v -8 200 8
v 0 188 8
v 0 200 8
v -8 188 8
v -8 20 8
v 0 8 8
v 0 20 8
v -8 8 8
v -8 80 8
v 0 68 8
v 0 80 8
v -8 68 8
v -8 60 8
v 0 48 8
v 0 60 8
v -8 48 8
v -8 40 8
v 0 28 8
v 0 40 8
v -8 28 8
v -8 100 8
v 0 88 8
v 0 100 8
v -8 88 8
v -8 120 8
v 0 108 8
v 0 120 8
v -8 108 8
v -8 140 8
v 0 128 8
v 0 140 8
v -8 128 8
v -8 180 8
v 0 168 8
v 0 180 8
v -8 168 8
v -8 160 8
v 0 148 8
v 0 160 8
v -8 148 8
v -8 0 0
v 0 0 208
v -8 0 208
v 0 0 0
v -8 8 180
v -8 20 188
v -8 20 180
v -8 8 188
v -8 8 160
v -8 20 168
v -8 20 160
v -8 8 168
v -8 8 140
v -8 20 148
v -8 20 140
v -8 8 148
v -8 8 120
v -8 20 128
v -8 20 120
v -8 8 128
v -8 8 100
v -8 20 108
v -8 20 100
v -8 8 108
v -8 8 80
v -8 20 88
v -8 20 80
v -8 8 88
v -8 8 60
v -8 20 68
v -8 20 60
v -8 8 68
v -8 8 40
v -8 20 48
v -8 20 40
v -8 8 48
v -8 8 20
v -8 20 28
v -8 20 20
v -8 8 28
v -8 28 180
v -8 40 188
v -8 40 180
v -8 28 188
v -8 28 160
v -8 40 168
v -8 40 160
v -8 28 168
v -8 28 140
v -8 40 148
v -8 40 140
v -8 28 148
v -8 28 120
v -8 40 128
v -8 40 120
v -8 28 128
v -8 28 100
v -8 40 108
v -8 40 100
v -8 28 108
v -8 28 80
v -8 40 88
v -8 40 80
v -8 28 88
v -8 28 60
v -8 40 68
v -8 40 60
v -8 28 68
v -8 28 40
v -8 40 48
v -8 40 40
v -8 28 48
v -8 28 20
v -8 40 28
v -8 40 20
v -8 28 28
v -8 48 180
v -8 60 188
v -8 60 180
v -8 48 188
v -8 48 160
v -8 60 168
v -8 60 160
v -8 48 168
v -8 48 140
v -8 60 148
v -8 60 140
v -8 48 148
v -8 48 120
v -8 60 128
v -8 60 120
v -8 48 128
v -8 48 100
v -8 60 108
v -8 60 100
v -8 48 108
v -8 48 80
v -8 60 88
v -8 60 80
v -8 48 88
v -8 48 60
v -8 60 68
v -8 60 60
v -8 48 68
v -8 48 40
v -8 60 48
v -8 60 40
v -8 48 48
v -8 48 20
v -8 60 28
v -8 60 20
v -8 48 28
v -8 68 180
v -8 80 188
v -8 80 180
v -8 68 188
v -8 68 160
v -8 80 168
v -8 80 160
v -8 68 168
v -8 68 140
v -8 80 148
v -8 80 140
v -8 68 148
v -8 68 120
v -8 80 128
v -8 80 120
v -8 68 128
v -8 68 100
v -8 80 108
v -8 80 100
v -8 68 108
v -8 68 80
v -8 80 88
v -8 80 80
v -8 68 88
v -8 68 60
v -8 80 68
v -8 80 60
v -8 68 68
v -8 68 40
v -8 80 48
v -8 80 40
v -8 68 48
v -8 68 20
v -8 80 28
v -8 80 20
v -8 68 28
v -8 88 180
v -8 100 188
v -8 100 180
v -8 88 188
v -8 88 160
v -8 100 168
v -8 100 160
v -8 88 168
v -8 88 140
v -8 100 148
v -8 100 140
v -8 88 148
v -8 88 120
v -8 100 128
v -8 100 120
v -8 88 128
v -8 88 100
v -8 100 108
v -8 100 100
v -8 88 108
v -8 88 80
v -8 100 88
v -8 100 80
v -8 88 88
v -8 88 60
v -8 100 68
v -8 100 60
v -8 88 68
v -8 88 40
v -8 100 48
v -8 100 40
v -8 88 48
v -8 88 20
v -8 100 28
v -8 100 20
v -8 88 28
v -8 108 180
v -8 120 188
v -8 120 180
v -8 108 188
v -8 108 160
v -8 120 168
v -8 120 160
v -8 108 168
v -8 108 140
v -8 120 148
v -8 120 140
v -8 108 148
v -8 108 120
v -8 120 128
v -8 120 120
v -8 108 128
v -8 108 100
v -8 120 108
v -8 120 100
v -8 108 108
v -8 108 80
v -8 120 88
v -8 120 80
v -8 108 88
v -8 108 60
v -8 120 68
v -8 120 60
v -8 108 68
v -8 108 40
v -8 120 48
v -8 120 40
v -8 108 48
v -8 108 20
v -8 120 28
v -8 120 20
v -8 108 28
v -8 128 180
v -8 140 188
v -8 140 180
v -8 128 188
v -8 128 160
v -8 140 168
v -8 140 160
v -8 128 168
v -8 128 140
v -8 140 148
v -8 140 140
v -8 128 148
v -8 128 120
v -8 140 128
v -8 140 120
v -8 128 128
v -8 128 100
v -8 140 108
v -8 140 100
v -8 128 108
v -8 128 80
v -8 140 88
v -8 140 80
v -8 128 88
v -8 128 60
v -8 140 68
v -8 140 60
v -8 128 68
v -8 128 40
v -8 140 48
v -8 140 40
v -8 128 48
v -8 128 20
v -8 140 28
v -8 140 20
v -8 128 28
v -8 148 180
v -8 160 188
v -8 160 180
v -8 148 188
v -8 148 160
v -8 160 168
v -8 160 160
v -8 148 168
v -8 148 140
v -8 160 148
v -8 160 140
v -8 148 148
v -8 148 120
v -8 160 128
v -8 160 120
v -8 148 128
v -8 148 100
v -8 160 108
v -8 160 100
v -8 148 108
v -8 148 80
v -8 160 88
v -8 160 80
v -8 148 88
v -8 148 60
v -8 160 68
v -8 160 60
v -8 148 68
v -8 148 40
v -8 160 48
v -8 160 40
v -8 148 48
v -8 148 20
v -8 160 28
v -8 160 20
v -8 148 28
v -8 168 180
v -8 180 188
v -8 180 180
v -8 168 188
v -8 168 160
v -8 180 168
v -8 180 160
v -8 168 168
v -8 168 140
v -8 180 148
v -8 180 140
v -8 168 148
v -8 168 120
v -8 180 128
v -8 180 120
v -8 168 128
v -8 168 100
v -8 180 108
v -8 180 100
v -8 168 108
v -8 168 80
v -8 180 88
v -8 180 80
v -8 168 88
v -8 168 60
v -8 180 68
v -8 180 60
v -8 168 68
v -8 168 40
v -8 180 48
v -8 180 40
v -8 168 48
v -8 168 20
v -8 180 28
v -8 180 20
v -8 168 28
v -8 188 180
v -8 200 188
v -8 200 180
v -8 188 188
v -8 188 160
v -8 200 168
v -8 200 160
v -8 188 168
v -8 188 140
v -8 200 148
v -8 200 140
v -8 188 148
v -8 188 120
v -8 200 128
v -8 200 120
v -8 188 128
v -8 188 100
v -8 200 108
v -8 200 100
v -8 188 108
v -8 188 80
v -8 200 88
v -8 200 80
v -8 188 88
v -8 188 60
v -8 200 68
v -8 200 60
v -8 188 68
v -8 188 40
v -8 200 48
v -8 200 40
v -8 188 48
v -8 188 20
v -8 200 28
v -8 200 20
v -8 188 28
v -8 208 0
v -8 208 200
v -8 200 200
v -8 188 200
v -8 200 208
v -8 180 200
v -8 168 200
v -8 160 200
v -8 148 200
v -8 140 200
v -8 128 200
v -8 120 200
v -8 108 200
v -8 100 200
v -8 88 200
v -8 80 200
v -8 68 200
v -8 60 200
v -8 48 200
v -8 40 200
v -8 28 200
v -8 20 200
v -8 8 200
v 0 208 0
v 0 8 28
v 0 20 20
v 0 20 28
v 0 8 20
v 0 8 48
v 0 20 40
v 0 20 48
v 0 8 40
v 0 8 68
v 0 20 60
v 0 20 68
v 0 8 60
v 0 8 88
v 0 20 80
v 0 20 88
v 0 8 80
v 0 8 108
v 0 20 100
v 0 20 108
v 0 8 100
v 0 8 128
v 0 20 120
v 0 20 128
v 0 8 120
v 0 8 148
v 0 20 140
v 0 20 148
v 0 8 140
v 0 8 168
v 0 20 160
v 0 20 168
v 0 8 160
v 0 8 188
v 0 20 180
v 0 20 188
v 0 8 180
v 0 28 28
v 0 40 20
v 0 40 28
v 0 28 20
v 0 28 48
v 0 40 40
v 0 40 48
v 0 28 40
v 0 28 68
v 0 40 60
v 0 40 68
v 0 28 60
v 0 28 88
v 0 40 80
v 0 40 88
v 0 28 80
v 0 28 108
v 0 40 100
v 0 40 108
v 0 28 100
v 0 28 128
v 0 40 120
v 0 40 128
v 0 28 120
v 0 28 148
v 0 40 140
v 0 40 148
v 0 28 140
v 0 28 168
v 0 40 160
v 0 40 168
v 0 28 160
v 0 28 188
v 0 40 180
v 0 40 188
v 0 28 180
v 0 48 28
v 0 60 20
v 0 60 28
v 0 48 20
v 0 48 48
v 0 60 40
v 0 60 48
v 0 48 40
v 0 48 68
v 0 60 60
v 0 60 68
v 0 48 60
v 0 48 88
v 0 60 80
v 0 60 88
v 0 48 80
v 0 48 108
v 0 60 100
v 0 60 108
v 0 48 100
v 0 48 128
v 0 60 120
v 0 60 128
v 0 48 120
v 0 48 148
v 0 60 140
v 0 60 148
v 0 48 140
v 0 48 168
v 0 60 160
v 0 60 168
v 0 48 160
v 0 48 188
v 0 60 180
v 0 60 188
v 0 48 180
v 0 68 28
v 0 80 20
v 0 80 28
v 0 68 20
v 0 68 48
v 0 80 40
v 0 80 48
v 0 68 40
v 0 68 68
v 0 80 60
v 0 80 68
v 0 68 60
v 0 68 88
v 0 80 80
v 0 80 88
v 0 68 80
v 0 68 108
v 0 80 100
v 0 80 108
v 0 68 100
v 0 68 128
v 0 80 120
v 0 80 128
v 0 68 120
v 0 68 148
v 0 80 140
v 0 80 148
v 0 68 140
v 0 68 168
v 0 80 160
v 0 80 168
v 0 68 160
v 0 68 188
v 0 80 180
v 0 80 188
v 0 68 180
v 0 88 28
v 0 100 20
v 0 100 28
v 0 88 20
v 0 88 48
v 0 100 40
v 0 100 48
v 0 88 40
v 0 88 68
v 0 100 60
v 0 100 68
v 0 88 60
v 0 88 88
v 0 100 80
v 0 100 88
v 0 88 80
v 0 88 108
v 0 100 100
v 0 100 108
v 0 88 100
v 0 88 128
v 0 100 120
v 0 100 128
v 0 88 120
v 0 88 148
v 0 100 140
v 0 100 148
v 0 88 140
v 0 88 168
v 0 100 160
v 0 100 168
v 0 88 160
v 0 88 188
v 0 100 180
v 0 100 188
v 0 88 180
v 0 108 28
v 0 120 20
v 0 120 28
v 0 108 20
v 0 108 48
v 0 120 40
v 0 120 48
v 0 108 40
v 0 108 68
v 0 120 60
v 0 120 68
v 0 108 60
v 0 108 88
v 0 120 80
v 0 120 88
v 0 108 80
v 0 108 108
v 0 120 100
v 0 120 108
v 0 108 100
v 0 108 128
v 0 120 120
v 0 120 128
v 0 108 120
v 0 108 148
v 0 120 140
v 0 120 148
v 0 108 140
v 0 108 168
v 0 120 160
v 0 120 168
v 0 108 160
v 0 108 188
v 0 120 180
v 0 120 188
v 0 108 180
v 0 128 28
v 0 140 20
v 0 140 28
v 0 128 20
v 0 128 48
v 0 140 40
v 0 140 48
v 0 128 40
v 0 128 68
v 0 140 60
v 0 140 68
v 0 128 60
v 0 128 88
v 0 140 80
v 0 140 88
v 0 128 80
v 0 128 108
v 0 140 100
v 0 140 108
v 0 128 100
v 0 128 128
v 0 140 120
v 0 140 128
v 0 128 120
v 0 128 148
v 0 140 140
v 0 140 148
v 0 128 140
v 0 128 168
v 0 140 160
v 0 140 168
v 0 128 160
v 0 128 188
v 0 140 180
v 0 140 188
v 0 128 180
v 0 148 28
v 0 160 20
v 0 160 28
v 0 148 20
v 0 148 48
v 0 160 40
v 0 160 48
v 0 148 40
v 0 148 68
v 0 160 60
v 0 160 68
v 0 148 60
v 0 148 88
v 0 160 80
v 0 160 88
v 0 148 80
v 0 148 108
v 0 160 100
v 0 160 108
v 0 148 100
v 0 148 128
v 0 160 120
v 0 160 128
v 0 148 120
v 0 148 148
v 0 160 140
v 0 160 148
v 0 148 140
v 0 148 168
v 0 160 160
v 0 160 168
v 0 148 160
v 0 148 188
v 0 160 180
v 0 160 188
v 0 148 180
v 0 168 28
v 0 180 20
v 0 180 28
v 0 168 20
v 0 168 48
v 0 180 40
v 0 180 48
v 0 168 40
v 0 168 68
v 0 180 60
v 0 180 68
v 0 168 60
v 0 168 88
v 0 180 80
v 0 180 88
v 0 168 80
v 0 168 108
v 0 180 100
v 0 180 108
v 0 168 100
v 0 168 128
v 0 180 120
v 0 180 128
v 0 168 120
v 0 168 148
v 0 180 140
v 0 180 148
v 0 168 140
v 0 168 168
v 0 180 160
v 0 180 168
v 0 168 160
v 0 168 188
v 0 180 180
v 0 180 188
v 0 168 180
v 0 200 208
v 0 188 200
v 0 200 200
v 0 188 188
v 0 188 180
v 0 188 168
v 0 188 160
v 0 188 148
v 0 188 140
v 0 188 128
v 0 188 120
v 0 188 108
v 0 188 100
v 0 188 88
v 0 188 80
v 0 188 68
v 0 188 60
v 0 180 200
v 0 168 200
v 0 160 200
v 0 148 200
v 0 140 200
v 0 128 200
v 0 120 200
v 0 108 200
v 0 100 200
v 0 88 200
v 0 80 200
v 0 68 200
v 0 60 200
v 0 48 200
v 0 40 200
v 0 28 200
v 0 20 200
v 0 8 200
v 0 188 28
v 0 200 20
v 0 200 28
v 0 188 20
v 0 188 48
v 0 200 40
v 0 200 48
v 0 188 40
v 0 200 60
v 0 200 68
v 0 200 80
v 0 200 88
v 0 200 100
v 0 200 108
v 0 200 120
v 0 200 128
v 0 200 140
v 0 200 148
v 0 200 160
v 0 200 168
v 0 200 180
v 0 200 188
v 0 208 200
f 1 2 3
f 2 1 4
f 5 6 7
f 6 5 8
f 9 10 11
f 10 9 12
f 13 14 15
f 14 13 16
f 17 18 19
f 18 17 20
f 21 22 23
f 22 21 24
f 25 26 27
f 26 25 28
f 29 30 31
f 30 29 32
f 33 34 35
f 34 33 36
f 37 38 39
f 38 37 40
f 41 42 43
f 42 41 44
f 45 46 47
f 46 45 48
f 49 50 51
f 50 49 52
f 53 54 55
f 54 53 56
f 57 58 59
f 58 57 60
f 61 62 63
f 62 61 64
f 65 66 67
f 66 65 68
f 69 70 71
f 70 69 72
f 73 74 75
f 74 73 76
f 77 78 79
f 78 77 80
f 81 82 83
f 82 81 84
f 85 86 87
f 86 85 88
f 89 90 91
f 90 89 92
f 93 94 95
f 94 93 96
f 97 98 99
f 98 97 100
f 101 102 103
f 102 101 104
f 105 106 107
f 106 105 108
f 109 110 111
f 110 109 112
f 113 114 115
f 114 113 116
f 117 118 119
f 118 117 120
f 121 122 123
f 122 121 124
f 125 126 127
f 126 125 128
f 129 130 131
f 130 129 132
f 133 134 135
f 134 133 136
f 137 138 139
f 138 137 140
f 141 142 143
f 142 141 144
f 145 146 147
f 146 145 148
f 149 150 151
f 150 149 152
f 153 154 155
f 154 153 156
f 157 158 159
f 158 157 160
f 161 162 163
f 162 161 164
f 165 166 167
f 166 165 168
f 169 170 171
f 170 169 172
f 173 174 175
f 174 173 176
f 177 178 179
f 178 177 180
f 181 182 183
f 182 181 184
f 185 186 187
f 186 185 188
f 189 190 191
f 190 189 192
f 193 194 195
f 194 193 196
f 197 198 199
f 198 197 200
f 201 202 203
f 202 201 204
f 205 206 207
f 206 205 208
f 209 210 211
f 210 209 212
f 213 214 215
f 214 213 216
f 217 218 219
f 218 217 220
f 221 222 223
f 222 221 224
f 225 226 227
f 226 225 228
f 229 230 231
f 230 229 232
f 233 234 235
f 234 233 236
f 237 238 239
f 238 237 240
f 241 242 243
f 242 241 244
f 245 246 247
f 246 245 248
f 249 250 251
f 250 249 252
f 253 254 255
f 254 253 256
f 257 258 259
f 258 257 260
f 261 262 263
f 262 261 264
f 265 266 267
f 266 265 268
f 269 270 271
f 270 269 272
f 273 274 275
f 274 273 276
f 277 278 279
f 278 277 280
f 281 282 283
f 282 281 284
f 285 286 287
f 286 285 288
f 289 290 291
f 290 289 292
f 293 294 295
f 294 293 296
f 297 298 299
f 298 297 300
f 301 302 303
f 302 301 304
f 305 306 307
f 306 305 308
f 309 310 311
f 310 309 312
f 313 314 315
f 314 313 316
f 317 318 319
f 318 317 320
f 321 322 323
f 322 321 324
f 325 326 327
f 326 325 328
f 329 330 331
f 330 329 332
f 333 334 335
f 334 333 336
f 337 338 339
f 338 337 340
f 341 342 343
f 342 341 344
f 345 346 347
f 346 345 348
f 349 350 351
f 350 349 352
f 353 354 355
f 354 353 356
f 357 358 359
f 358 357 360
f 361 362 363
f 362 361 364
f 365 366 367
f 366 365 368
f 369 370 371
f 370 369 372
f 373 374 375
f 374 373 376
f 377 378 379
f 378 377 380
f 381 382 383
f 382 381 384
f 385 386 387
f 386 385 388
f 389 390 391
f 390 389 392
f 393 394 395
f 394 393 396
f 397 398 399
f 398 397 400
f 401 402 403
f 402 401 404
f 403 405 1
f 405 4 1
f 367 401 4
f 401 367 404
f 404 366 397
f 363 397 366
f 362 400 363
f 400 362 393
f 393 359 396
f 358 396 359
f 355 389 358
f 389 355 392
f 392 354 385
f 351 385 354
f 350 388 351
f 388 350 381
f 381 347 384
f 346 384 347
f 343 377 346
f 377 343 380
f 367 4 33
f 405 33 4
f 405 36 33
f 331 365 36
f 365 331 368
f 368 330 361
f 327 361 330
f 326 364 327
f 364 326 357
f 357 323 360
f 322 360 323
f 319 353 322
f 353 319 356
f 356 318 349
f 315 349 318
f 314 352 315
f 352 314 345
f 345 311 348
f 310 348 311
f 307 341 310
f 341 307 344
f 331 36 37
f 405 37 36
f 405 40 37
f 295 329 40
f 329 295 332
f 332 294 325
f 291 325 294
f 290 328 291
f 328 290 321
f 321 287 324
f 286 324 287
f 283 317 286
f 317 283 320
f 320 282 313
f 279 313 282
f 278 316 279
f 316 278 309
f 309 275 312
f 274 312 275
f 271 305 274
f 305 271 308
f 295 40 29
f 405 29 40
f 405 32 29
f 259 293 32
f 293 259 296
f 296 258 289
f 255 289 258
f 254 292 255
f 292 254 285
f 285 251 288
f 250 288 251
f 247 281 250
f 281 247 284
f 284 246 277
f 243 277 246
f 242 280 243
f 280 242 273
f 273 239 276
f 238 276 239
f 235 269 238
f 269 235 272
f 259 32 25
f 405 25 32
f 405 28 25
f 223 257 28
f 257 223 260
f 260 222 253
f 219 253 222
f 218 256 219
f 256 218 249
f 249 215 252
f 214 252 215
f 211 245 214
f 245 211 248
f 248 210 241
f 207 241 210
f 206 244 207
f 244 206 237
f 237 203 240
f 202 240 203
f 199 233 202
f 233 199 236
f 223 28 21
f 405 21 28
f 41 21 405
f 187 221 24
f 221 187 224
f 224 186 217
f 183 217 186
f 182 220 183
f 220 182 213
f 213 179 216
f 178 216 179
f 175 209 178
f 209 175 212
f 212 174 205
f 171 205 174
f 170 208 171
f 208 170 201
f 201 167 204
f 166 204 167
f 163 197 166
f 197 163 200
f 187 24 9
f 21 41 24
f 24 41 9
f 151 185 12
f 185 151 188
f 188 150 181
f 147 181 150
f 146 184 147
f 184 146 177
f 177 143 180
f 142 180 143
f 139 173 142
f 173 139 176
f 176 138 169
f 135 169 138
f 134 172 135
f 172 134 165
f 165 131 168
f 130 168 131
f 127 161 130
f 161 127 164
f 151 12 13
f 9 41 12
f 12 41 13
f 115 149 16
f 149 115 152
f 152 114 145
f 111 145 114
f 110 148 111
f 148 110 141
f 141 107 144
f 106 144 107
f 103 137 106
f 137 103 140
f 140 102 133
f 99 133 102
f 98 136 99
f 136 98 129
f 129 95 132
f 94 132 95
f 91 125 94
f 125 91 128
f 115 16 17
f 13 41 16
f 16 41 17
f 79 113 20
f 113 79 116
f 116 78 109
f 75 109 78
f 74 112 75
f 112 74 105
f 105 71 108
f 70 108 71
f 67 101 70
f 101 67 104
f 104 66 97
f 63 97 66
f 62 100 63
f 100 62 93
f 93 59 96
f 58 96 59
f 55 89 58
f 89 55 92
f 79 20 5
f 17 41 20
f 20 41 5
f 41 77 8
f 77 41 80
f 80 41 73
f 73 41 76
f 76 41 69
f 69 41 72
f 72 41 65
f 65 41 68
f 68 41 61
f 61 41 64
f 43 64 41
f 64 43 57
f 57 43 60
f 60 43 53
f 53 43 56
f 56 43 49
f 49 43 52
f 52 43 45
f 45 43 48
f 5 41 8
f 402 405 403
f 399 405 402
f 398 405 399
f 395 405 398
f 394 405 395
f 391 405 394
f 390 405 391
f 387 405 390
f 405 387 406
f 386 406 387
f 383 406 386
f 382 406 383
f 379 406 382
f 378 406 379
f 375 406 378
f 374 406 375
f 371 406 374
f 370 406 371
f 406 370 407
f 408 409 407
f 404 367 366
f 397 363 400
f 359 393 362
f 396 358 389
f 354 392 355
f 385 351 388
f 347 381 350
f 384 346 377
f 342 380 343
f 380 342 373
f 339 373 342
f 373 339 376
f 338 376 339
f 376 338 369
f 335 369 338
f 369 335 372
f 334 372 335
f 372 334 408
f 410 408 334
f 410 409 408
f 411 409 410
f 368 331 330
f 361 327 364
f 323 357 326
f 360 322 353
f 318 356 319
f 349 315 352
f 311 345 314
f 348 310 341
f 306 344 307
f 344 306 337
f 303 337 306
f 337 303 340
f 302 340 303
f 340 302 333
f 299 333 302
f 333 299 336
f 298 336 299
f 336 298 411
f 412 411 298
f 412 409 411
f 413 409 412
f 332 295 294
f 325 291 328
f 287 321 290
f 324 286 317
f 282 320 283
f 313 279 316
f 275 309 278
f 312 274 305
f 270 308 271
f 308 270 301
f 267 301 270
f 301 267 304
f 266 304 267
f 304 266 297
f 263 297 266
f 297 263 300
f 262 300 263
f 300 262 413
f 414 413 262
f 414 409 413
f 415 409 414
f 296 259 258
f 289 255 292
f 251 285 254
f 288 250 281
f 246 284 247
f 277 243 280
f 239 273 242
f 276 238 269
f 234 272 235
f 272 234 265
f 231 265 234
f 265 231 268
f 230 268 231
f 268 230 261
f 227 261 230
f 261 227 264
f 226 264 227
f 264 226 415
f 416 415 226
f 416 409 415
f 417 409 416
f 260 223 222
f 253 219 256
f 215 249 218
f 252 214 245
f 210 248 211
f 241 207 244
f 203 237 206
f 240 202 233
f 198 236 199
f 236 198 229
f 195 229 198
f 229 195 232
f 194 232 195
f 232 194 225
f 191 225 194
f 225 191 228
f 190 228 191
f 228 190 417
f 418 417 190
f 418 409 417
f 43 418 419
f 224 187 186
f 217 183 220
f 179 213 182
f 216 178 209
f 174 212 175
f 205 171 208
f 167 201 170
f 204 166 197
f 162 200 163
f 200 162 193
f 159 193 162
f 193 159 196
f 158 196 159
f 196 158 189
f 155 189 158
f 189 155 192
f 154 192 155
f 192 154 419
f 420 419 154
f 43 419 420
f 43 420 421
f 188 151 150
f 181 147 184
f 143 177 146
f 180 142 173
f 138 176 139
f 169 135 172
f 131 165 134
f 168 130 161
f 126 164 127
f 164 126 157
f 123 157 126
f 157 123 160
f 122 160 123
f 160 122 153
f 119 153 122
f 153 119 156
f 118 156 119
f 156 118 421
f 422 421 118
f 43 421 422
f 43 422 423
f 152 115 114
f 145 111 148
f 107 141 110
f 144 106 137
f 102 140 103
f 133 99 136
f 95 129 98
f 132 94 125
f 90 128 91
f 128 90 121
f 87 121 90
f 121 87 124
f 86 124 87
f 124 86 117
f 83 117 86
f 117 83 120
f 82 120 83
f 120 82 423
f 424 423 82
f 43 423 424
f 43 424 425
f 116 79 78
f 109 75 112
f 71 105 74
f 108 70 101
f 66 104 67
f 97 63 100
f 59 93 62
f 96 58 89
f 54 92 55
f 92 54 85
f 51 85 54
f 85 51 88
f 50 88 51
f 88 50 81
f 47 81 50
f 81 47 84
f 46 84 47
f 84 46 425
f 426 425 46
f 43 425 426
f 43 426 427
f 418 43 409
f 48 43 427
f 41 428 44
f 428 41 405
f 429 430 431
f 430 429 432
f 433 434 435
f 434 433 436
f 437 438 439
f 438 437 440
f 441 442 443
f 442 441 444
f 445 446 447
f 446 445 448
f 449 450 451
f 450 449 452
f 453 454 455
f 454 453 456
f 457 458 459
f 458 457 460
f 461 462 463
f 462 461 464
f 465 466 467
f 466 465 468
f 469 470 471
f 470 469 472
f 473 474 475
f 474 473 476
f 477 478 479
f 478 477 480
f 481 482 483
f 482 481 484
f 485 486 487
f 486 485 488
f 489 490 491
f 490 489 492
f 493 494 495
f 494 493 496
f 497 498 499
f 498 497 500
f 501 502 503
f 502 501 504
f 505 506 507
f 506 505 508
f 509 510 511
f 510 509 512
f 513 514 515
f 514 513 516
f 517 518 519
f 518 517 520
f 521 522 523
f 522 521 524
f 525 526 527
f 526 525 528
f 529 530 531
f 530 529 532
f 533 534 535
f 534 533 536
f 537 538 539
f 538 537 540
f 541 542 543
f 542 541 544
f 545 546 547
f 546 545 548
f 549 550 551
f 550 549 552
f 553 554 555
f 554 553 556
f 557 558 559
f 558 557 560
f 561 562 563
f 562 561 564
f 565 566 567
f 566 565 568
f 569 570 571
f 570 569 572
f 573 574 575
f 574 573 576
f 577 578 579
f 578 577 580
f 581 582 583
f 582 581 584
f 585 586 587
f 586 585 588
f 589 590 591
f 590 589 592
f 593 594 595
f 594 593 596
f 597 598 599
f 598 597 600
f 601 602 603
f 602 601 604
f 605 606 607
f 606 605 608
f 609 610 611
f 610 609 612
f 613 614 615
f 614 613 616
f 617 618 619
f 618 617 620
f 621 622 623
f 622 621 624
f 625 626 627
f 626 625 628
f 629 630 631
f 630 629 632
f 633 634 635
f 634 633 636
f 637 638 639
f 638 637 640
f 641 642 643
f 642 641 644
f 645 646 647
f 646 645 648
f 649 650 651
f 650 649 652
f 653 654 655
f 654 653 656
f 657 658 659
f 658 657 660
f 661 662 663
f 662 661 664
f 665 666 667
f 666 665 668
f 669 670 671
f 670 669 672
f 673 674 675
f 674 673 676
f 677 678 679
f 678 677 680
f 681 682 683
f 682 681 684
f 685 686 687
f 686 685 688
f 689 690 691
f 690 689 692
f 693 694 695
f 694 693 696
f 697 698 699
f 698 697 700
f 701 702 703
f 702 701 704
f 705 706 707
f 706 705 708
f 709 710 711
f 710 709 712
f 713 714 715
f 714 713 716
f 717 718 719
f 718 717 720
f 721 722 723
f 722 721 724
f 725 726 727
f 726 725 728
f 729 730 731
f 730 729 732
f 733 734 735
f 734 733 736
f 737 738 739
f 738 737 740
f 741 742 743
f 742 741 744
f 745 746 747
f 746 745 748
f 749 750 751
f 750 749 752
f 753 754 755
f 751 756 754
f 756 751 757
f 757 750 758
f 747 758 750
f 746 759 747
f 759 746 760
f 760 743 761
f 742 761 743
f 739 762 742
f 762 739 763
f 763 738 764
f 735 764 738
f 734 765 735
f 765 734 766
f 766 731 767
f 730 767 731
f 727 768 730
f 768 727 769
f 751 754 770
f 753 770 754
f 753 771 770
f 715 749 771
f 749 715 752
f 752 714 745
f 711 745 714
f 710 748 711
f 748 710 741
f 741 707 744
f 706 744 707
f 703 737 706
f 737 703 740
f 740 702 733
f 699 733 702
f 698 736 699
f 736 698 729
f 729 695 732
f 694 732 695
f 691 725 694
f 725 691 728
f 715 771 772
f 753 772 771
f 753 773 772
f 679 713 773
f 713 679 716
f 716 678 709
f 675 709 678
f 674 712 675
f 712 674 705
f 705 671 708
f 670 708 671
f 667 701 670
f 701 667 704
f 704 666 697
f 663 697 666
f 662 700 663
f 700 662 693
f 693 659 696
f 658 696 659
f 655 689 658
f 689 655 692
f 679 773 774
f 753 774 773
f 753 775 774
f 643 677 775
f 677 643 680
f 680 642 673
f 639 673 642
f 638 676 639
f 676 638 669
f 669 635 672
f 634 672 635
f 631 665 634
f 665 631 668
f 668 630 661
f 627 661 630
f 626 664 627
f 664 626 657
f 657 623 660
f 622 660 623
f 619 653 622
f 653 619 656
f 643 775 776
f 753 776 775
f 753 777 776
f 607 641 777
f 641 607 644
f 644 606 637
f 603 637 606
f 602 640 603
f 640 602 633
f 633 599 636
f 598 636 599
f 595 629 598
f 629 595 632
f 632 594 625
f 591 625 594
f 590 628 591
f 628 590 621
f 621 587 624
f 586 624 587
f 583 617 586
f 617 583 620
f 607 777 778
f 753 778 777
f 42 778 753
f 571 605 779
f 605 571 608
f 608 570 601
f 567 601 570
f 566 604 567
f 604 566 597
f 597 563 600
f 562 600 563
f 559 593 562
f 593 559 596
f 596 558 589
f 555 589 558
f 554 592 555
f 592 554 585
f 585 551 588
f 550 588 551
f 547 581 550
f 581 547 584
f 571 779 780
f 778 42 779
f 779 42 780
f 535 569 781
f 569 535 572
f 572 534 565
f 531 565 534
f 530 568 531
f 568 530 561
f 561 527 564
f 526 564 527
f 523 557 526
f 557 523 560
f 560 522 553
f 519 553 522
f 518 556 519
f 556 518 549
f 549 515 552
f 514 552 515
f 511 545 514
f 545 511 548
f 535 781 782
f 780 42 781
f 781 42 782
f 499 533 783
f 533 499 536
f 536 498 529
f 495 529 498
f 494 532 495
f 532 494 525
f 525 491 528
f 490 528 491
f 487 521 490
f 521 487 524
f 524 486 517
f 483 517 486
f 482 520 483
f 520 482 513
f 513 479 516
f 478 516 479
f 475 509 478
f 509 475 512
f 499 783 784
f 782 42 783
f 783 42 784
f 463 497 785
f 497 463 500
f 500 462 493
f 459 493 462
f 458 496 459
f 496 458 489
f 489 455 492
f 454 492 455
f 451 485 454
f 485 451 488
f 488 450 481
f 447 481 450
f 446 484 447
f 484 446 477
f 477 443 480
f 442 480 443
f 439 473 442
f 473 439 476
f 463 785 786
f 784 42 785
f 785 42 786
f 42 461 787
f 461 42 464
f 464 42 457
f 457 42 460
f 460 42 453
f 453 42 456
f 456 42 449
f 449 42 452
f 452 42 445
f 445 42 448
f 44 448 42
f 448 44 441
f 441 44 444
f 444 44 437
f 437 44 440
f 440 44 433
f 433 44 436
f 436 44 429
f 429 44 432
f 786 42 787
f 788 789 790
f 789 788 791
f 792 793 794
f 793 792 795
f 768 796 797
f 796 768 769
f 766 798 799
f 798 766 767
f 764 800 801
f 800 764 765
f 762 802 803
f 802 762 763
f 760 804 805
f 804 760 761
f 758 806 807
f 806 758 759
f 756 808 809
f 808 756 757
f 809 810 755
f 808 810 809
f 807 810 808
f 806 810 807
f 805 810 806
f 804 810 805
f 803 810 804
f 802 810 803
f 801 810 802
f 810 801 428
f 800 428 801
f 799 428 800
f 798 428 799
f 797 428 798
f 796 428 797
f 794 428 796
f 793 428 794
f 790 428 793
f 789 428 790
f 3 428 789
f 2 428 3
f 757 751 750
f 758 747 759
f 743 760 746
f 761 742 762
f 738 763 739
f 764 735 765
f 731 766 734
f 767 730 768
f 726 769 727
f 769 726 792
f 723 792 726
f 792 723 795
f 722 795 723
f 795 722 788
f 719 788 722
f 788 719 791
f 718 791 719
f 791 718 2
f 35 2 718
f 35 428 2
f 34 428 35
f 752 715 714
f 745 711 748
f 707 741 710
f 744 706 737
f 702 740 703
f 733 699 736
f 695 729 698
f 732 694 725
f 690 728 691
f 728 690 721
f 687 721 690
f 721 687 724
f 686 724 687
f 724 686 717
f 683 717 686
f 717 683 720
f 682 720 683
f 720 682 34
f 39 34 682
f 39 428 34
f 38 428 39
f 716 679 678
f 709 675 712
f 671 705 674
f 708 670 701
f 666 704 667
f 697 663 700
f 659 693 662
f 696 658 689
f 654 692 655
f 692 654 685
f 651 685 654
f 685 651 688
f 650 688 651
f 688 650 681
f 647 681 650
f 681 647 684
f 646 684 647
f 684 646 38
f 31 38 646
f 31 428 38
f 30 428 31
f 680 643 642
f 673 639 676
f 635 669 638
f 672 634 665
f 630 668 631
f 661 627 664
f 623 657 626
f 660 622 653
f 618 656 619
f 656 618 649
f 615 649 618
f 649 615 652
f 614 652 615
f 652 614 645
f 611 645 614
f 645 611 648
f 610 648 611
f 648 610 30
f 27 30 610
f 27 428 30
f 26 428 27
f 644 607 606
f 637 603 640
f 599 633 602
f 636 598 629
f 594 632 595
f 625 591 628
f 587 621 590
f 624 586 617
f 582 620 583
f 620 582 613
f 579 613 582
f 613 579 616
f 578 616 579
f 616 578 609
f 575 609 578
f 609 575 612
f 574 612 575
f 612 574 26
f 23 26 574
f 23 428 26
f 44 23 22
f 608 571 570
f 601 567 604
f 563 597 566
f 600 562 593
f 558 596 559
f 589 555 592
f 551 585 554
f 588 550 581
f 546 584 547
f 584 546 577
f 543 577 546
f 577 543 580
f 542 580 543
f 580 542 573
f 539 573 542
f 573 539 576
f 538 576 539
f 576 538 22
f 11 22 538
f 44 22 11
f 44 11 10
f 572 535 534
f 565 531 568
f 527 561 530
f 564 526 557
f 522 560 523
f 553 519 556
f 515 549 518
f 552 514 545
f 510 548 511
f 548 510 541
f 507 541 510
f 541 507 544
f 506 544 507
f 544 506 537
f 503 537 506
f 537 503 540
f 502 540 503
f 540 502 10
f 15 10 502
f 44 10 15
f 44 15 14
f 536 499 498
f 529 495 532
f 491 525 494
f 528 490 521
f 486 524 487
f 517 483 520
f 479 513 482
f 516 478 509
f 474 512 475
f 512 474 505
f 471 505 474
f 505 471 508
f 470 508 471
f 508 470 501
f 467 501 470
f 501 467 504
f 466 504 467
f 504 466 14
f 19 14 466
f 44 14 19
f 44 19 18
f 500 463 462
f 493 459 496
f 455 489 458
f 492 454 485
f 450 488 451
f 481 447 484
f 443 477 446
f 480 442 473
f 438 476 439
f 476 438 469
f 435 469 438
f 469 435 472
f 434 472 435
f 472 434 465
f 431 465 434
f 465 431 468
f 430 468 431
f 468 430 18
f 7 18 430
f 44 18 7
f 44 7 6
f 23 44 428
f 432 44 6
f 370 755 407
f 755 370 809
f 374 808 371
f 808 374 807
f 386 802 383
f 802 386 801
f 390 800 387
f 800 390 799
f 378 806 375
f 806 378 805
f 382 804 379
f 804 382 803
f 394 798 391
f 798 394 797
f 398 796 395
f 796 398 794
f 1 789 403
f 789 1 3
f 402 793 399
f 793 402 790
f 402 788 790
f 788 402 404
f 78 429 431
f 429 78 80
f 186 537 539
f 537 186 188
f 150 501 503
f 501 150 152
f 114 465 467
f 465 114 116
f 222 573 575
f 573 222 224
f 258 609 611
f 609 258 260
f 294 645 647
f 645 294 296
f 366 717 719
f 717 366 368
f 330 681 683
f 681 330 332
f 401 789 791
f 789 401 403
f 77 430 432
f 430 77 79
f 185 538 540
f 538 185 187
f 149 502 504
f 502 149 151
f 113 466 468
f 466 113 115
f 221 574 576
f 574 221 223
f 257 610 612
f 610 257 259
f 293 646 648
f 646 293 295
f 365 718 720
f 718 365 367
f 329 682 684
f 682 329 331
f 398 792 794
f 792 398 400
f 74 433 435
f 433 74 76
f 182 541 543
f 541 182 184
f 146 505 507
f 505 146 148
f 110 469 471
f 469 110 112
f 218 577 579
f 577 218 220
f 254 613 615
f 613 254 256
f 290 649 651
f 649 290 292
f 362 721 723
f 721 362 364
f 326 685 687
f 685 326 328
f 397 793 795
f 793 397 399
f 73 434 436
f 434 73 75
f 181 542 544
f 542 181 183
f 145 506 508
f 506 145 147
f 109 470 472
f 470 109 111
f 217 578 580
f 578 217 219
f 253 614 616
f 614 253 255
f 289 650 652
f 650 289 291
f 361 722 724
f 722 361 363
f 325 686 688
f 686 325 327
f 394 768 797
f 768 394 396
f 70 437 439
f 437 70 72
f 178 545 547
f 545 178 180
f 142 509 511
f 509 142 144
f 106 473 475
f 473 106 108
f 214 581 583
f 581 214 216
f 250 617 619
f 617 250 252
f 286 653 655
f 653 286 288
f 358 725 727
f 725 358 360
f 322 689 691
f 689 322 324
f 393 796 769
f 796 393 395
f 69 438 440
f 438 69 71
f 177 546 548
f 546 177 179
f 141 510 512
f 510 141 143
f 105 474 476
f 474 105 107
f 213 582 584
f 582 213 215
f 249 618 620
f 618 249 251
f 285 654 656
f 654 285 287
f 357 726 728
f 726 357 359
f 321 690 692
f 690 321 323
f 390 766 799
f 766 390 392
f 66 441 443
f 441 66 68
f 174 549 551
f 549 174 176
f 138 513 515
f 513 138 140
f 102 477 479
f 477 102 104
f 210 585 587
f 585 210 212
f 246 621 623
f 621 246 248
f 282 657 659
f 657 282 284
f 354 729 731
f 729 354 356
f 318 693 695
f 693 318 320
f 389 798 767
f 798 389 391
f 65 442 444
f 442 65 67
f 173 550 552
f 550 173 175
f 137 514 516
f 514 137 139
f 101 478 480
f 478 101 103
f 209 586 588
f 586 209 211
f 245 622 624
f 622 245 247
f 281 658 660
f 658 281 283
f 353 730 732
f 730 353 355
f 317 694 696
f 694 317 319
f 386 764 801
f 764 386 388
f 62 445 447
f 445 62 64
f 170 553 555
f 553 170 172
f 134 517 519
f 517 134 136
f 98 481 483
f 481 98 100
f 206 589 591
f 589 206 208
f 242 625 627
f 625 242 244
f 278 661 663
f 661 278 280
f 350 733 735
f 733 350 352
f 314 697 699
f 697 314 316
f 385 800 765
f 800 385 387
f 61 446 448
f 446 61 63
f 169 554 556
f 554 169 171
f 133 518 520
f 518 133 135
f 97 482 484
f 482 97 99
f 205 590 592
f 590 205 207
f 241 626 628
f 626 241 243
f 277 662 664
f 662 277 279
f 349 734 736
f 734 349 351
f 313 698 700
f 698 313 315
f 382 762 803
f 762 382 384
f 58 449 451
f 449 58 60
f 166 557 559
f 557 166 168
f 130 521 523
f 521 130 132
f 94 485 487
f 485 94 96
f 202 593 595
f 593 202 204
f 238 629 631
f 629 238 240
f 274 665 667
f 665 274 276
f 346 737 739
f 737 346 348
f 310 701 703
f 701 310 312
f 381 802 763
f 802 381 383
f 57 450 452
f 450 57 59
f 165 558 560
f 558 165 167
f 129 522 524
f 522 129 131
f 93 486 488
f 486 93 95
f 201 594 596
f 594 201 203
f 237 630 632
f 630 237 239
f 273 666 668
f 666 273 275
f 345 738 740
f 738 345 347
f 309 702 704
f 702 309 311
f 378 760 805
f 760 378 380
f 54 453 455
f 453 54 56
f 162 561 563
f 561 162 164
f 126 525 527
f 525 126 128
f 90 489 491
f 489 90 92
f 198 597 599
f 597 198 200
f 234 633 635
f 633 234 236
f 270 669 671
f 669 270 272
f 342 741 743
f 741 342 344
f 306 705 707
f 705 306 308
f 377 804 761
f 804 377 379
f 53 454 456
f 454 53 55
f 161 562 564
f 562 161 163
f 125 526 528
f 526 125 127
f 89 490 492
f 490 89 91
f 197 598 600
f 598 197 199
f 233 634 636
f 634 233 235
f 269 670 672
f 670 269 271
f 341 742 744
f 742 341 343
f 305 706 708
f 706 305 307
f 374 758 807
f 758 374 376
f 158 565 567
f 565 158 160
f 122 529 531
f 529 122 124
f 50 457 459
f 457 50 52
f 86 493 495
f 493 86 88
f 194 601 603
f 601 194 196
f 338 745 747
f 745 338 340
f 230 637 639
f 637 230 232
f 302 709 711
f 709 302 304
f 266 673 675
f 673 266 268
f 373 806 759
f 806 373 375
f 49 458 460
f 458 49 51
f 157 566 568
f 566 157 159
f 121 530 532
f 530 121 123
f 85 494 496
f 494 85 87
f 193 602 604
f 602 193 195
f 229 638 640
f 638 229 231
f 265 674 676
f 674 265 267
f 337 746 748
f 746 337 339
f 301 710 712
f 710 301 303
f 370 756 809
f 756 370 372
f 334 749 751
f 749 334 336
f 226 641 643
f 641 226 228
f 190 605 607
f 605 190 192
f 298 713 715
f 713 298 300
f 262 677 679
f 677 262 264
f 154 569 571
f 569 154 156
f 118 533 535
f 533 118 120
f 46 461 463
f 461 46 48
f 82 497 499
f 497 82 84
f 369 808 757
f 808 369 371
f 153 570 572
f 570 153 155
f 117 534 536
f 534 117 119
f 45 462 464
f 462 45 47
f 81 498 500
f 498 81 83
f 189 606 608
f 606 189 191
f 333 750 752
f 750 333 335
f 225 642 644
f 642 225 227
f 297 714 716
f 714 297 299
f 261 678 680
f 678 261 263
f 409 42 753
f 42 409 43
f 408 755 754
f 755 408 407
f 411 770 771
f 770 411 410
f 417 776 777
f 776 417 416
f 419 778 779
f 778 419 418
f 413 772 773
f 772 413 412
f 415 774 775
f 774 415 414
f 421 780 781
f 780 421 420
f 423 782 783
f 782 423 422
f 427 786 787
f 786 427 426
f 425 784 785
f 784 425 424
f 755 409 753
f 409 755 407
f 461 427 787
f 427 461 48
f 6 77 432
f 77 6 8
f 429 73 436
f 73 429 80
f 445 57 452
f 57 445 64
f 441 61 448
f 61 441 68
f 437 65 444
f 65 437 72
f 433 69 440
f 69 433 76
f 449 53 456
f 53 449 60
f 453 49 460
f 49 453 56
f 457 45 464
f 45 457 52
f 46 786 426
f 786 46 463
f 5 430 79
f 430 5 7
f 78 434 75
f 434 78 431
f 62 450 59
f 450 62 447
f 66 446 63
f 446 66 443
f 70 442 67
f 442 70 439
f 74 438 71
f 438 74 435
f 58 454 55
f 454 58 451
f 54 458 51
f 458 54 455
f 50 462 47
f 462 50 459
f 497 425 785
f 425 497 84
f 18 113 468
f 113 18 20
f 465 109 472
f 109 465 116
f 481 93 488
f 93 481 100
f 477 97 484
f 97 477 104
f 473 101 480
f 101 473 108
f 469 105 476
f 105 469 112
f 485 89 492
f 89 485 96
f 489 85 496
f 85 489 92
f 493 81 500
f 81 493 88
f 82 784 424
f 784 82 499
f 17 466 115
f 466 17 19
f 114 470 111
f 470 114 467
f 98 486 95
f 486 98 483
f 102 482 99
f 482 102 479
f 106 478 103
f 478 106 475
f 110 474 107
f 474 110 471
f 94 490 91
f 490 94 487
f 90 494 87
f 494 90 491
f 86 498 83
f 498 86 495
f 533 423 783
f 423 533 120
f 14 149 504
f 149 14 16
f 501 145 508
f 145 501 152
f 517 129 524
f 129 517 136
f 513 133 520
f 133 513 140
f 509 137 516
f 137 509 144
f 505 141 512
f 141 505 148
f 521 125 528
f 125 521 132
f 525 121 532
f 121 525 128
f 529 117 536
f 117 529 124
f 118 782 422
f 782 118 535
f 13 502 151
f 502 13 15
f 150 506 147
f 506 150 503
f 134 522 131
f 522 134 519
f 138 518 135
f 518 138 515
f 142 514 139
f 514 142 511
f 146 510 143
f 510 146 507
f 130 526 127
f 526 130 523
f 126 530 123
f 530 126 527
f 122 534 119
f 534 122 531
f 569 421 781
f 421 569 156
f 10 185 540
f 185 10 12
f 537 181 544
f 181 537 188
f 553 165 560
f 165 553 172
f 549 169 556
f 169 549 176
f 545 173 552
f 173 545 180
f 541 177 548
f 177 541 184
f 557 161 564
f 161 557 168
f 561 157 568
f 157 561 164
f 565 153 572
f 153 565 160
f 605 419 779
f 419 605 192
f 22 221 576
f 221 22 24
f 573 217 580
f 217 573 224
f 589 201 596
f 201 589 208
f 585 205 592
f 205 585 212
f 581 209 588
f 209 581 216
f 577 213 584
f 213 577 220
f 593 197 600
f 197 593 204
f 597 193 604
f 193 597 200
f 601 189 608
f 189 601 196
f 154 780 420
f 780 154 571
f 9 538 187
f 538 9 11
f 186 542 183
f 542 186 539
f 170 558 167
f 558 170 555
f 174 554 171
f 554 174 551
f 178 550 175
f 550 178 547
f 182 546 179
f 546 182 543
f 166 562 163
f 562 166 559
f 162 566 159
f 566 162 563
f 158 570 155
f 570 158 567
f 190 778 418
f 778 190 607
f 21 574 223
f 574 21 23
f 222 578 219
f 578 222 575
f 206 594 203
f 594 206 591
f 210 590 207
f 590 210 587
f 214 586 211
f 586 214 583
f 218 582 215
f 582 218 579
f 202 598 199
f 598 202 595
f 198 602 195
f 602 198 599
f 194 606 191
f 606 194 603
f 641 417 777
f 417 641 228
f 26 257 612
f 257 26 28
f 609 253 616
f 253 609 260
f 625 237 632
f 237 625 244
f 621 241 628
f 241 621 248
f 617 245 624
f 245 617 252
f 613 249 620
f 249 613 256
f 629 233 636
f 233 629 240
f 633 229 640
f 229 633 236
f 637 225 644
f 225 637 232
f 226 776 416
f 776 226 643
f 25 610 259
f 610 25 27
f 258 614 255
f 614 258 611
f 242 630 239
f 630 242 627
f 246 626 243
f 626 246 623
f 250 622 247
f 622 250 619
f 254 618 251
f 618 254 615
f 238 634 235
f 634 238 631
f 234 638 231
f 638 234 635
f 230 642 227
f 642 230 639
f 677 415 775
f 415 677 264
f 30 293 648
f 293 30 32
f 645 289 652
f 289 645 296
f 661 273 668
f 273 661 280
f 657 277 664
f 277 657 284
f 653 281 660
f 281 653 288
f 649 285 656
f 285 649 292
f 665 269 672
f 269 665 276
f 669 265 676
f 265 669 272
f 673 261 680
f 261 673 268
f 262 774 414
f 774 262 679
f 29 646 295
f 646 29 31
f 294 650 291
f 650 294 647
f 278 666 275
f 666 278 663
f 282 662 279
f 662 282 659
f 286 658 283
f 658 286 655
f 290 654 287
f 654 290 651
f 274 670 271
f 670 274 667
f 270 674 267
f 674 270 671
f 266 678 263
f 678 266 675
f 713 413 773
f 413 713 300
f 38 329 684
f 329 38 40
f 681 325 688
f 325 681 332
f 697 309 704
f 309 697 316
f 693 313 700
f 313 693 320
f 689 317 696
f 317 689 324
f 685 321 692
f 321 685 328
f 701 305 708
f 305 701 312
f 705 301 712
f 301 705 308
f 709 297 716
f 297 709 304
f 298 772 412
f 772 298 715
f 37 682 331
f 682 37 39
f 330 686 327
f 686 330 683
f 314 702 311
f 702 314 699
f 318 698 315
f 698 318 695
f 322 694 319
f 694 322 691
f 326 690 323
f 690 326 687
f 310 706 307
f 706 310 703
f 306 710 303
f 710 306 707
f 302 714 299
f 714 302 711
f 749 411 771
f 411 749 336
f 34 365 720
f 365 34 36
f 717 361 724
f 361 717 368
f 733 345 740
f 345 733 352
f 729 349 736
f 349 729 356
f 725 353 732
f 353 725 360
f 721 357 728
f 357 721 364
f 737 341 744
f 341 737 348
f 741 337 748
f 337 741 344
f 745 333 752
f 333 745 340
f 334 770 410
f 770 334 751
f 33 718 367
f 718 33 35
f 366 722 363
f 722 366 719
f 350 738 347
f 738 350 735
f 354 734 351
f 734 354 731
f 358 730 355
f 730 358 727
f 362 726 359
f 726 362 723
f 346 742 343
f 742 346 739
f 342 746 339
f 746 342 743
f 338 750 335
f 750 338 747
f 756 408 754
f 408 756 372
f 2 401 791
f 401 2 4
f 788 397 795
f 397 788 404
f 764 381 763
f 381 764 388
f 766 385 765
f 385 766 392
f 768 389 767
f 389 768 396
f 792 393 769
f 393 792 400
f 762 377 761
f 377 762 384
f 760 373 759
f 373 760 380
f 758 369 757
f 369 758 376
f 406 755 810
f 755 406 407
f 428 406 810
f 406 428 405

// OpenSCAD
window_num = 10; // number of windows
window_size = 12; // size of individual windows
strut_size = 8; // size of the struts

for (i = [0:window_num]) {
rotate ([0, 0, 90])
translate ([0, 0, (window_size + strut_size) * i])
cube (size=[window_num * (window_size + strut_size), strut_size, strut_size]);
}
for (i = [0:window_num]) {
rotate ([0, 270, 0])
translate ([0, (window_size + strut_size) * i, 0])
cube (size=[window_num * (window_size + strut_size), strut_size, strut_size]);
}
